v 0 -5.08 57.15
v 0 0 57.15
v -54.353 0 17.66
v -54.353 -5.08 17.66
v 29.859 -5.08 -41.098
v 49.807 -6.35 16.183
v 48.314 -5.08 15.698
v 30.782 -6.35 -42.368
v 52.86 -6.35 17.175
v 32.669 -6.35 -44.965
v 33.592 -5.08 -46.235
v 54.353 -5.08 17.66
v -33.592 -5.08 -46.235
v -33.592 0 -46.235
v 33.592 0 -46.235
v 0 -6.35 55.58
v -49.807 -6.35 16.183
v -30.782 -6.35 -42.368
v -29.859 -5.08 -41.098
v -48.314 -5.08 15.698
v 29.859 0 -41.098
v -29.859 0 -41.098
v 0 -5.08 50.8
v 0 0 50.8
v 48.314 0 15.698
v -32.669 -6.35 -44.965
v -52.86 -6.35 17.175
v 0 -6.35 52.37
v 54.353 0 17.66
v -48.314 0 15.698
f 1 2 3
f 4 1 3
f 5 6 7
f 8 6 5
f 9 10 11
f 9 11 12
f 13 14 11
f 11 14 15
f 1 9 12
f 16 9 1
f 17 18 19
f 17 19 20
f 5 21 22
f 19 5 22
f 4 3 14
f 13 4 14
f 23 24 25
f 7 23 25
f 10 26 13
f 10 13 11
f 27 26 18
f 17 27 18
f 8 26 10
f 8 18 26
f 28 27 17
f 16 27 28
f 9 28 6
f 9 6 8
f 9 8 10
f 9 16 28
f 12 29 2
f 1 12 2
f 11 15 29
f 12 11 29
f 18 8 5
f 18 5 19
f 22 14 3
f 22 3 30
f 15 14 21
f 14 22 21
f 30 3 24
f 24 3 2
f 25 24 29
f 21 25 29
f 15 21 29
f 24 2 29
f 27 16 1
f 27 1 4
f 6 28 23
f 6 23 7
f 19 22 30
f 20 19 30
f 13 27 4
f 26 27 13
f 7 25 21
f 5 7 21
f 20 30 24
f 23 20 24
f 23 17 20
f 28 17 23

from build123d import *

# Parameters (mm, degrees)
F1_DEPTH = 6.35
F2_SIZE2 = 1.27
F2_SIZE  = 1.27


with BuildPart() as f1:
    # F0 (on Front) → F1 (new body)
    with BuildSketch(Plane.XZ):
        Polygon((54.35288, 17.660321), (0, 57.15), (-54.35288, 17.660321), (-33.591927, -46.235321), (33.591927, -46.235321), align=None)
        Polygon((-48.313671, 15.698063), (0, 50.8), (48.313671, 15.698063), (29.859491, -41.098063), (-29.859491, -41.098063), align=None, mode=Mode.SUBTRACT)
    extrude(amount=F1_DEPTH)

    # F2
    f2_edges = [f1.edges().sort_by_distance(p)[0] for p in [
        (43.972404, -6.35, -14.2875),
        (27.17644, -6.35, 37.405161),
        (-27.17644, -6.35, 37.405161),
        (-43.972404, -6.35, -14.2875),
        (0, -6.35, -46.235321),
        (-24.156836, -6.35, 33.249032),
        (24.156836, -6.35, 33.249032),
        (39.086581, -6.35, -12.7),
        (0, -6.35, -41.098063),
        (-39.086581, -6.35, -12.7),
    ]]
    chamfer(f2_edges, length=F2_SIZE, length2=F2_SIZE2)


solid = f1.part
